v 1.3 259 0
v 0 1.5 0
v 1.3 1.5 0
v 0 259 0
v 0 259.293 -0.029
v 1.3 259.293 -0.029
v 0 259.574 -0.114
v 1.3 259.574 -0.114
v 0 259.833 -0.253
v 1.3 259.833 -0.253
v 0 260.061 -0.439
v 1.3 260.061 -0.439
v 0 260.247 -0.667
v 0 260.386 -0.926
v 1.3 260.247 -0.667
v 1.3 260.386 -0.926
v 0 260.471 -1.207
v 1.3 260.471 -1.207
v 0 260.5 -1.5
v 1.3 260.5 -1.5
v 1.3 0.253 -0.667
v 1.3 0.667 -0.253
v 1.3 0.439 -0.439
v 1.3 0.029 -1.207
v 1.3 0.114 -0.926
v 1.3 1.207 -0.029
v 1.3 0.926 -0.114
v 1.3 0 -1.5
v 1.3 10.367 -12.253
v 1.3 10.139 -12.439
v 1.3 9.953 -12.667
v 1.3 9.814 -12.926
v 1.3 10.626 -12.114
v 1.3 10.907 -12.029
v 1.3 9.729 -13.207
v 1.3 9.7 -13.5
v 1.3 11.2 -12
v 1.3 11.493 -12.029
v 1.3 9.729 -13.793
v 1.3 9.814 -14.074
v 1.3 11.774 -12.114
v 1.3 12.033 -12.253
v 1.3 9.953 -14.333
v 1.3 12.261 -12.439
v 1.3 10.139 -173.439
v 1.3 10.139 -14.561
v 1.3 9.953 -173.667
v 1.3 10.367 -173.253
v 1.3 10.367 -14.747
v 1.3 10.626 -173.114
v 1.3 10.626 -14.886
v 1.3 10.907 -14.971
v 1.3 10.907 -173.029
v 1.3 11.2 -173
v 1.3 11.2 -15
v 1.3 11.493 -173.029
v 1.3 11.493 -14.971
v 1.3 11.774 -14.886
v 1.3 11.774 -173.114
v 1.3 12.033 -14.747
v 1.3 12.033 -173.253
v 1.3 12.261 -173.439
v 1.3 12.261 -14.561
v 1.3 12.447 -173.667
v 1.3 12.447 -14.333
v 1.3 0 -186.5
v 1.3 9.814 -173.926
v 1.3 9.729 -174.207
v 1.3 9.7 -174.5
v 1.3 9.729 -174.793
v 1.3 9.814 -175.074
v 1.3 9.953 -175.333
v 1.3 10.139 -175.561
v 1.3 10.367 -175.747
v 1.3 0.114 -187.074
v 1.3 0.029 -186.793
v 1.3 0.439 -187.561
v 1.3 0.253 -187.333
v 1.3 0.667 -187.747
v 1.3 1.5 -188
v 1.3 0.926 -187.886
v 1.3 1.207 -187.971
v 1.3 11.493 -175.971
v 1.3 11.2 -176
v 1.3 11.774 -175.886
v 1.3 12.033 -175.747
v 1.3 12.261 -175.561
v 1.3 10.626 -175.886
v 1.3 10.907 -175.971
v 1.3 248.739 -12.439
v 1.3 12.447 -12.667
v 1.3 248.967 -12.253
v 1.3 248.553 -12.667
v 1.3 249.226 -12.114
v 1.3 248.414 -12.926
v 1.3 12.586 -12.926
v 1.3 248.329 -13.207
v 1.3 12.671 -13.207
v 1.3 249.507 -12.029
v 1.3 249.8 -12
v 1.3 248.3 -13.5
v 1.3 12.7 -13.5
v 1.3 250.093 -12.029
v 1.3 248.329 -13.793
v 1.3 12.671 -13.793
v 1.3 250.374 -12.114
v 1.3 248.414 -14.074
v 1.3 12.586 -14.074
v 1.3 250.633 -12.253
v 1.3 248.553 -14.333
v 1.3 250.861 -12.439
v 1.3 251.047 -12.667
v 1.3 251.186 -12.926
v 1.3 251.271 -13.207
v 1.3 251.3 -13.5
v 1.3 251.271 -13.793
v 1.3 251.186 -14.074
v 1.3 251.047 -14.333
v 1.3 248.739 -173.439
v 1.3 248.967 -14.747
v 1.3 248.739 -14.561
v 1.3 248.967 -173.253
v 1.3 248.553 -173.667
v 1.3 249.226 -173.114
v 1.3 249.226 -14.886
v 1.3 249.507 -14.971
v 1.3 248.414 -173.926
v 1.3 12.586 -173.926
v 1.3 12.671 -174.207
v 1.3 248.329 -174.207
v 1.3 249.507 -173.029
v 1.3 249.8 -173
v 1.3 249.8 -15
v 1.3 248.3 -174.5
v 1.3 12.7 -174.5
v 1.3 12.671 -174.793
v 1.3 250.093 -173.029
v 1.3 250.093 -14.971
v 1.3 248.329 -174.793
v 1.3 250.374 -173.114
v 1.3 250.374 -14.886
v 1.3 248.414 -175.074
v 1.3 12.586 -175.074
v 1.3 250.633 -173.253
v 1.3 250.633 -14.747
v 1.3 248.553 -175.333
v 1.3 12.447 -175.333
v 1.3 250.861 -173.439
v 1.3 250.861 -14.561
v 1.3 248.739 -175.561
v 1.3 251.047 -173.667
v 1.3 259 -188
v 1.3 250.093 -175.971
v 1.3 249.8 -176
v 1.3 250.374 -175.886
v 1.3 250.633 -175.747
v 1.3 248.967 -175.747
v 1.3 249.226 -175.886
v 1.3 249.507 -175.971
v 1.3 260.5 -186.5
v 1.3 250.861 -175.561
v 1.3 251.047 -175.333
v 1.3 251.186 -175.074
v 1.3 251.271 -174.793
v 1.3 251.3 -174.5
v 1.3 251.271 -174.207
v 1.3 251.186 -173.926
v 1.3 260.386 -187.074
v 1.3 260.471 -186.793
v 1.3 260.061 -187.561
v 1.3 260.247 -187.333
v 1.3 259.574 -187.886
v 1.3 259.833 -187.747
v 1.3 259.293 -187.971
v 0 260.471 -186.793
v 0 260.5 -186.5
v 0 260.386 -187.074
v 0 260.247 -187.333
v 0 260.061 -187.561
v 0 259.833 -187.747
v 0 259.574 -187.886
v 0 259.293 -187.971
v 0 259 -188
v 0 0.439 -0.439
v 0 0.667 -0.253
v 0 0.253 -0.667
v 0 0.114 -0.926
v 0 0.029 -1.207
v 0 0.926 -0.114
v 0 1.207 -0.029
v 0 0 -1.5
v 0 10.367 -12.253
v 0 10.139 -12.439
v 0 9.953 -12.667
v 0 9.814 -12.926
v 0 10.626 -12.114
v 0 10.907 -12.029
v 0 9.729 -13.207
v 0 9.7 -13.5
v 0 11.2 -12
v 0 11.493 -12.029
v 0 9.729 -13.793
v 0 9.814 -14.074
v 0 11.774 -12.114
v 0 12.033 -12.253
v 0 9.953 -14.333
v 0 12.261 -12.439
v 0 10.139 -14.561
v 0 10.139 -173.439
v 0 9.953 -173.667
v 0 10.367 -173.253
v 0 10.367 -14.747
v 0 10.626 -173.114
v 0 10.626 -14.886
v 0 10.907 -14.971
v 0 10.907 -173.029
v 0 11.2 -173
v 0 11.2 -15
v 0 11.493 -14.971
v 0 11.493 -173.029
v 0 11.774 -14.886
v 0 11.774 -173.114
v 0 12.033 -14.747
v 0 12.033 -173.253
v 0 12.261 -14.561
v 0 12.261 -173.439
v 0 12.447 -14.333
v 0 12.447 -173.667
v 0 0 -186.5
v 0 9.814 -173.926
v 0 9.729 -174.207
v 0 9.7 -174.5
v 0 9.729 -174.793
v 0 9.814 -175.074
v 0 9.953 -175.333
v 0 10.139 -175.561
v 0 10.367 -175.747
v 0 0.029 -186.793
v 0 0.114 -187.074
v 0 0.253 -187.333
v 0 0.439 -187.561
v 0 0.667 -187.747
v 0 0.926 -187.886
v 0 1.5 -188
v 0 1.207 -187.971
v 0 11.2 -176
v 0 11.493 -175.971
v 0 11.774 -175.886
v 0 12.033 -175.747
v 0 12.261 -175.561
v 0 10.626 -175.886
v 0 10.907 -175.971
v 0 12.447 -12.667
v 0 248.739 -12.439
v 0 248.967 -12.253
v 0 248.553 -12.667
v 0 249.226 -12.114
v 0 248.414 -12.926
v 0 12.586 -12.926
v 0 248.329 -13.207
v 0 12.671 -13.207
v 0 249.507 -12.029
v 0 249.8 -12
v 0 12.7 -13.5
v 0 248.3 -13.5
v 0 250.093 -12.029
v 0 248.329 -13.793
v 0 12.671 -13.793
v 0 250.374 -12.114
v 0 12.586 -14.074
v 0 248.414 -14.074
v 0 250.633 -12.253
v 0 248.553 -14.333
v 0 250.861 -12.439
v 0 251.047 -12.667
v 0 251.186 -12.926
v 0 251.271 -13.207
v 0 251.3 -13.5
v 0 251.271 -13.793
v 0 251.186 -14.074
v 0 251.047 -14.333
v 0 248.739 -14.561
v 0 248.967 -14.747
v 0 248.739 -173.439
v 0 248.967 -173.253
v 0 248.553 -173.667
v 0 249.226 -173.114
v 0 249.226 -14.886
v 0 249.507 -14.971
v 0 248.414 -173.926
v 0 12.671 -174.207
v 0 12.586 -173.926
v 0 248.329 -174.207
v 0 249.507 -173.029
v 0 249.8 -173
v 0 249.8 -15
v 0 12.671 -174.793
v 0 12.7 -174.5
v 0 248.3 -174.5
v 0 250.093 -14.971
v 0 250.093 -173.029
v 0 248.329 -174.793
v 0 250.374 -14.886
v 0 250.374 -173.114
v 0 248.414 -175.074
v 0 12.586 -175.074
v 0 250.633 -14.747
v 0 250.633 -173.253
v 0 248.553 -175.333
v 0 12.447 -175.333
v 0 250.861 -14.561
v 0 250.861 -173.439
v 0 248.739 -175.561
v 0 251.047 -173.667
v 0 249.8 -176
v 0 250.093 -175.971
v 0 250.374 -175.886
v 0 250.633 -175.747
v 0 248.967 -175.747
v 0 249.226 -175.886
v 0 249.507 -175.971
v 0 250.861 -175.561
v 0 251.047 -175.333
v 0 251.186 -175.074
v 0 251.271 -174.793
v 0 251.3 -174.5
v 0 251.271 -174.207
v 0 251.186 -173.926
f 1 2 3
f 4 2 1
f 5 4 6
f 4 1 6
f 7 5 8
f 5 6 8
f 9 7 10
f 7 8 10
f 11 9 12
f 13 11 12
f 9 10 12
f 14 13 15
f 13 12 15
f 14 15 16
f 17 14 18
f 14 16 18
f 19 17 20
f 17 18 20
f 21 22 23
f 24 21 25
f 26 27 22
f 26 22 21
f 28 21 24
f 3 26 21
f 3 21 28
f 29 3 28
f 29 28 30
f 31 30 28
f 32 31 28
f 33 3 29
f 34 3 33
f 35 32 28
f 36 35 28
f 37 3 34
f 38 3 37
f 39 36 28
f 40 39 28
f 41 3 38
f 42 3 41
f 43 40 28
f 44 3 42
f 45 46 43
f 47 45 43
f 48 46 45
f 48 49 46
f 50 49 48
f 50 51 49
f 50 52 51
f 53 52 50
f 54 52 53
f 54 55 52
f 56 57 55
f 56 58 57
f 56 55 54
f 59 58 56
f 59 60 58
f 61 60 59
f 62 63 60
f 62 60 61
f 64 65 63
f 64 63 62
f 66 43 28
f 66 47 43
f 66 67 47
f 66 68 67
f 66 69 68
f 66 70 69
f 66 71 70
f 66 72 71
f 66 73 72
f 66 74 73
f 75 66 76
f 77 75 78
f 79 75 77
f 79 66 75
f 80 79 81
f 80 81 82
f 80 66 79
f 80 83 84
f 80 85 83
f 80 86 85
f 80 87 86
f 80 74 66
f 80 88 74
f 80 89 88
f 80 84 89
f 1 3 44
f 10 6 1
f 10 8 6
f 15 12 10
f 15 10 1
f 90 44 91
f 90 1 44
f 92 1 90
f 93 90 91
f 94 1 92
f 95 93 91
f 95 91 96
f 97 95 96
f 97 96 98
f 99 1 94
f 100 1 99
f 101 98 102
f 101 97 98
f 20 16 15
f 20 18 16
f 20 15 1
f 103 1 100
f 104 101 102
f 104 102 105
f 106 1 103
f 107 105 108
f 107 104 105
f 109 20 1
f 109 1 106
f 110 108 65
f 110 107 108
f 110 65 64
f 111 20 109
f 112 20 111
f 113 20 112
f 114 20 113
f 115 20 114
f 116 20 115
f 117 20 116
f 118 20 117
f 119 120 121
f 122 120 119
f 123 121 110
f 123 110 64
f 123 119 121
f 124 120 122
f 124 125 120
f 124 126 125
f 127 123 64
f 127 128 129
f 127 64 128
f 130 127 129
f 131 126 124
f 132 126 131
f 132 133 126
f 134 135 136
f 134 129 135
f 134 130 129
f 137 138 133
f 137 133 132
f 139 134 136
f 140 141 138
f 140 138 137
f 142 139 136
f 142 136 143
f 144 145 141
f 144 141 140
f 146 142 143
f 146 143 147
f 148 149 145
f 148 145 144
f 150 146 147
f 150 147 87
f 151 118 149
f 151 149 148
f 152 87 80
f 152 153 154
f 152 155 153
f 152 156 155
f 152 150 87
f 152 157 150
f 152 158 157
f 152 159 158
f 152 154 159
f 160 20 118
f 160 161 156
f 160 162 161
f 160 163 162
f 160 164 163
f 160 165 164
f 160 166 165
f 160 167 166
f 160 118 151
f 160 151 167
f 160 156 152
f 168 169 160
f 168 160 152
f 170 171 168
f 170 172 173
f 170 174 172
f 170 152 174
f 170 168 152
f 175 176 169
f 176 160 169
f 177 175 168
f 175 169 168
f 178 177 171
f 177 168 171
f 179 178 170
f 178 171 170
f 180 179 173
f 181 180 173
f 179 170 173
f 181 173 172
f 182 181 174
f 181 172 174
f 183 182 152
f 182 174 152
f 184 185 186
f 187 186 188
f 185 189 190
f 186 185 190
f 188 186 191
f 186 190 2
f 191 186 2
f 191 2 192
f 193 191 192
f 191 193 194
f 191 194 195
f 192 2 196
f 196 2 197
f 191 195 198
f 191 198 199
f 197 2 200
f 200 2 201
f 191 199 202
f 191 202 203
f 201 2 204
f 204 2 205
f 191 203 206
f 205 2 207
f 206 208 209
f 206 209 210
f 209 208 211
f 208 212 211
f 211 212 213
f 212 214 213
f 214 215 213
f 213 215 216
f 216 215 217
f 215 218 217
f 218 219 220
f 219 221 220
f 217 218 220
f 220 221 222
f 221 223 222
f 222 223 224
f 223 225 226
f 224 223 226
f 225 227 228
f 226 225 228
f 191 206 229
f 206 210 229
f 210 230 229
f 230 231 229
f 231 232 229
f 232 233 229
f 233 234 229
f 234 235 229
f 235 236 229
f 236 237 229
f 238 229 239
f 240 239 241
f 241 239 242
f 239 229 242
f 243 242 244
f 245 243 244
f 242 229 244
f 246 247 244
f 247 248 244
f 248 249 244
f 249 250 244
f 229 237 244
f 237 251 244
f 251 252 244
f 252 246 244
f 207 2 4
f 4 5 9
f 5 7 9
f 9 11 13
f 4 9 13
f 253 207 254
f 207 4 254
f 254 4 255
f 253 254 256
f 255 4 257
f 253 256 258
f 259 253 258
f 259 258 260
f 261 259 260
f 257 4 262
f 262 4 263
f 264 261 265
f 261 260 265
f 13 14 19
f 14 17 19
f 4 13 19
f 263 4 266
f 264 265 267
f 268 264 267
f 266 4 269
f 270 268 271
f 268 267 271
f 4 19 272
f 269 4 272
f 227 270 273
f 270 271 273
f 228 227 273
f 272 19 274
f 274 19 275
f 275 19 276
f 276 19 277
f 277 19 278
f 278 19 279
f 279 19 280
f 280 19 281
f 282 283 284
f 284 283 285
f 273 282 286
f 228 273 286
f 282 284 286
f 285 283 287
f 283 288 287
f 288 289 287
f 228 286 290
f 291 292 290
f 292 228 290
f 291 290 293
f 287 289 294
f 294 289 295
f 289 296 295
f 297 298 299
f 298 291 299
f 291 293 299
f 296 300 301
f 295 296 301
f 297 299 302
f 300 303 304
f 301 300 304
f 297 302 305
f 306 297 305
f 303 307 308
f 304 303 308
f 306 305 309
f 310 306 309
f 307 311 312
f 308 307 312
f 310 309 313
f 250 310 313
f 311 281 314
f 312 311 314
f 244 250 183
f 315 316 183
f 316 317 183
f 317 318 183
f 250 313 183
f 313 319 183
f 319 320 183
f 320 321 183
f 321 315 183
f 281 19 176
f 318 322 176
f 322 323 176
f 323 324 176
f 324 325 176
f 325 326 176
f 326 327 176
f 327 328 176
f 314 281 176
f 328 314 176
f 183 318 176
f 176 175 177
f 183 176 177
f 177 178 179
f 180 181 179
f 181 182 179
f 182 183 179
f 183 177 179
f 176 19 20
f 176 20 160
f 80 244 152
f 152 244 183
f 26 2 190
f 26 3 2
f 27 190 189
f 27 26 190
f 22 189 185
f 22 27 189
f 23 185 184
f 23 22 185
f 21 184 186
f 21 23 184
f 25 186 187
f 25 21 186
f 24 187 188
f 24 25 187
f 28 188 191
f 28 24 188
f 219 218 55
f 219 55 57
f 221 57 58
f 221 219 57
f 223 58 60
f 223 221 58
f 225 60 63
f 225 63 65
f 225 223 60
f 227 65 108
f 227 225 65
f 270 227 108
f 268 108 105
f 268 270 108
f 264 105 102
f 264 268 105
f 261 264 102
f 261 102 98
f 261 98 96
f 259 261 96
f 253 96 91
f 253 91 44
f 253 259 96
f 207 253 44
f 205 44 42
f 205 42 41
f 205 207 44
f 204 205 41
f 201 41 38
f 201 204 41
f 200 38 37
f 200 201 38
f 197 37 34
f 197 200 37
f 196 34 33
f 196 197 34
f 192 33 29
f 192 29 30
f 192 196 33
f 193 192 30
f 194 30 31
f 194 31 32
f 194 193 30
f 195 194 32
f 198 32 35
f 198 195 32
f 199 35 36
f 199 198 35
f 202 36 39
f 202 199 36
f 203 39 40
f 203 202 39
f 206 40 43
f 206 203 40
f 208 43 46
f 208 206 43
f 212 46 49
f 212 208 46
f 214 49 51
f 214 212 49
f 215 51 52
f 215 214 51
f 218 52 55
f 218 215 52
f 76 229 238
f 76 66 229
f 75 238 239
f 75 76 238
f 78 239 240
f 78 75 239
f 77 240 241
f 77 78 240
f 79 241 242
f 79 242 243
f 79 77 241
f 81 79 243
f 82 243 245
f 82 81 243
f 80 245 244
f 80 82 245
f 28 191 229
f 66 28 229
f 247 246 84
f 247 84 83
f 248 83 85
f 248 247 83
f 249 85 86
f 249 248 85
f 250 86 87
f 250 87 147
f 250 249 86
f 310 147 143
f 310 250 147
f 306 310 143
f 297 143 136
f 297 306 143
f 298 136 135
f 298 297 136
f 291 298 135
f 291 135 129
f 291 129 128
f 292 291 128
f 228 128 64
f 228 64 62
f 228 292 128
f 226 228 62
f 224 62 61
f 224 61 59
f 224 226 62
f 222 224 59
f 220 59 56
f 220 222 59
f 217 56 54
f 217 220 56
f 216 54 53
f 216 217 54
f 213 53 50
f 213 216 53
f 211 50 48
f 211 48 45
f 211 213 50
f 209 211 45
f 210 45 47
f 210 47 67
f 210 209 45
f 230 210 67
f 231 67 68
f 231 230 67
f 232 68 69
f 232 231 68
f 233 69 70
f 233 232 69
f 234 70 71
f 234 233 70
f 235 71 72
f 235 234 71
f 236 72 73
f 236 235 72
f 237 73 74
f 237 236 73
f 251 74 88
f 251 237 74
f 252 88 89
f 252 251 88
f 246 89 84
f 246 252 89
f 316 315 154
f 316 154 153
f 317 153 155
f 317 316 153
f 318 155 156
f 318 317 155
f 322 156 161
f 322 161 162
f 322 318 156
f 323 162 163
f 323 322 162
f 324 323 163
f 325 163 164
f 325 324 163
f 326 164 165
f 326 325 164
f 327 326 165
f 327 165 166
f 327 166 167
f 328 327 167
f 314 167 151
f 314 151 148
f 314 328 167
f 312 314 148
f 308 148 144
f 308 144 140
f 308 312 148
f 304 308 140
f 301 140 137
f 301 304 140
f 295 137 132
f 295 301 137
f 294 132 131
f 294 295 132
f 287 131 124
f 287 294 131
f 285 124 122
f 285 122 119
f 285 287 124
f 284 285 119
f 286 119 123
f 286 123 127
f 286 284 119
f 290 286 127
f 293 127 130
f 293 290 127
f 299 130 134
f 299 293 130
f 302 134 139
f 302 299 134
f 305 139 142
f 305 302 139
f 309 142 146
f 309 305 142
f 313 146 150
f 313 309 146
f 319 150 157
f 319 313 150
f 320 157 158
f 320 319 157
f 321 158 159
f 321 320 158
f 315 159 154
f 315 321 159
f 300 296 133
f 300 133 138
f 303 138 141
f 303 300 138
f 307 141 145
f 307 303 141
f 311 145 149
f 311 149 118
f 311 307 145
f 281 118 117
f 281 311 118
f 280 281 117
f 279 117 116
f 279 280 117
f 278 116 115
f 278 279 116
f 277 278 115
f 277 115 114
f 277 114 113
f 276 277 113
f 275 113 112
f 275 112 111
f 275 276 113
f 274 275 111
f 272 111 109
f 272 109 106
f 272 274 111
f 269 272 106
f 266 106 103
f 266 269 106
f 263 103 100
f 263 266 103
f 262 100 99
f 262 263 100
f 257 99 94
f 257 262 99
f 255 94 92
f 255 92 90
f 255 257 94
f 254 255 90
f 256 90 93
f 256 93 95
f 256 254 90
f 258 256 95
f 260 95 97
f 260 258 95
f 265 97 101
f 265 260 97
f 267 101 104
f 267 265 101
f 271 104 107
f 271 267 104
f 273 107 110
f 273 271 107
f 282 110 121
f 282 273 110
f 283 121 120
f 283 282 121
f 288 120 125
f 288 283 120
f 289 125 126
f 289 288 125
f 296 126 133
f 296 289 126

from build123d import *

# Parameters (mm, degrees)
SKETCH_1_W      = 188
SKETCH_1_H      = 260.5
SKETCH_1_R      = 1.5
EXTRUDE_2_DEPTH = 1.3
FILLET_1_R      = 1.5


with BuildPart() as part:
    # 草图1 → 凸台-拉伸2 (new body)
    with BuildSketch(Plane(origin=(0, 0, 0), x_dir=(0, 0, -1), z_dir=(1, 0, 0))):
        with Locations((94, 130.25)):
            Rectangle(SKETCH_1_W, SKETCH_1_H)
        with Locations((174.5, 249.8)):
            Circle(SKETCH_1_R, mode=Mode.SUBTRACT)
        with Locations((174.5, 11.2)):
            Circle(SKETCH_1_R, mode=Mode.SUBTRACT)
        with Locations((13.5, 249.8)):
            Circle(SKETCH_1_R, mode=Mode.SUBTRACT)
        with Locations((13.5, 11.2)):
            Circle(SKETCH_1_R, mode=Mode.SUBTRACT)
    extrude(amount=EXTRUDE_2_DEPTH)

    # 圆角1
    fillet_1_edges = [part.edges().sort_by_distance(p)[0] for p in [
        (0.65, 260.5, 0),
        (0.65, 260.5, -188),
        (0.65, 0, -188),
        (0.65, 0, 0),
    ]]
    fillet(fillet_1_edges, radius=FILLET_1_R)


solid = part.part
